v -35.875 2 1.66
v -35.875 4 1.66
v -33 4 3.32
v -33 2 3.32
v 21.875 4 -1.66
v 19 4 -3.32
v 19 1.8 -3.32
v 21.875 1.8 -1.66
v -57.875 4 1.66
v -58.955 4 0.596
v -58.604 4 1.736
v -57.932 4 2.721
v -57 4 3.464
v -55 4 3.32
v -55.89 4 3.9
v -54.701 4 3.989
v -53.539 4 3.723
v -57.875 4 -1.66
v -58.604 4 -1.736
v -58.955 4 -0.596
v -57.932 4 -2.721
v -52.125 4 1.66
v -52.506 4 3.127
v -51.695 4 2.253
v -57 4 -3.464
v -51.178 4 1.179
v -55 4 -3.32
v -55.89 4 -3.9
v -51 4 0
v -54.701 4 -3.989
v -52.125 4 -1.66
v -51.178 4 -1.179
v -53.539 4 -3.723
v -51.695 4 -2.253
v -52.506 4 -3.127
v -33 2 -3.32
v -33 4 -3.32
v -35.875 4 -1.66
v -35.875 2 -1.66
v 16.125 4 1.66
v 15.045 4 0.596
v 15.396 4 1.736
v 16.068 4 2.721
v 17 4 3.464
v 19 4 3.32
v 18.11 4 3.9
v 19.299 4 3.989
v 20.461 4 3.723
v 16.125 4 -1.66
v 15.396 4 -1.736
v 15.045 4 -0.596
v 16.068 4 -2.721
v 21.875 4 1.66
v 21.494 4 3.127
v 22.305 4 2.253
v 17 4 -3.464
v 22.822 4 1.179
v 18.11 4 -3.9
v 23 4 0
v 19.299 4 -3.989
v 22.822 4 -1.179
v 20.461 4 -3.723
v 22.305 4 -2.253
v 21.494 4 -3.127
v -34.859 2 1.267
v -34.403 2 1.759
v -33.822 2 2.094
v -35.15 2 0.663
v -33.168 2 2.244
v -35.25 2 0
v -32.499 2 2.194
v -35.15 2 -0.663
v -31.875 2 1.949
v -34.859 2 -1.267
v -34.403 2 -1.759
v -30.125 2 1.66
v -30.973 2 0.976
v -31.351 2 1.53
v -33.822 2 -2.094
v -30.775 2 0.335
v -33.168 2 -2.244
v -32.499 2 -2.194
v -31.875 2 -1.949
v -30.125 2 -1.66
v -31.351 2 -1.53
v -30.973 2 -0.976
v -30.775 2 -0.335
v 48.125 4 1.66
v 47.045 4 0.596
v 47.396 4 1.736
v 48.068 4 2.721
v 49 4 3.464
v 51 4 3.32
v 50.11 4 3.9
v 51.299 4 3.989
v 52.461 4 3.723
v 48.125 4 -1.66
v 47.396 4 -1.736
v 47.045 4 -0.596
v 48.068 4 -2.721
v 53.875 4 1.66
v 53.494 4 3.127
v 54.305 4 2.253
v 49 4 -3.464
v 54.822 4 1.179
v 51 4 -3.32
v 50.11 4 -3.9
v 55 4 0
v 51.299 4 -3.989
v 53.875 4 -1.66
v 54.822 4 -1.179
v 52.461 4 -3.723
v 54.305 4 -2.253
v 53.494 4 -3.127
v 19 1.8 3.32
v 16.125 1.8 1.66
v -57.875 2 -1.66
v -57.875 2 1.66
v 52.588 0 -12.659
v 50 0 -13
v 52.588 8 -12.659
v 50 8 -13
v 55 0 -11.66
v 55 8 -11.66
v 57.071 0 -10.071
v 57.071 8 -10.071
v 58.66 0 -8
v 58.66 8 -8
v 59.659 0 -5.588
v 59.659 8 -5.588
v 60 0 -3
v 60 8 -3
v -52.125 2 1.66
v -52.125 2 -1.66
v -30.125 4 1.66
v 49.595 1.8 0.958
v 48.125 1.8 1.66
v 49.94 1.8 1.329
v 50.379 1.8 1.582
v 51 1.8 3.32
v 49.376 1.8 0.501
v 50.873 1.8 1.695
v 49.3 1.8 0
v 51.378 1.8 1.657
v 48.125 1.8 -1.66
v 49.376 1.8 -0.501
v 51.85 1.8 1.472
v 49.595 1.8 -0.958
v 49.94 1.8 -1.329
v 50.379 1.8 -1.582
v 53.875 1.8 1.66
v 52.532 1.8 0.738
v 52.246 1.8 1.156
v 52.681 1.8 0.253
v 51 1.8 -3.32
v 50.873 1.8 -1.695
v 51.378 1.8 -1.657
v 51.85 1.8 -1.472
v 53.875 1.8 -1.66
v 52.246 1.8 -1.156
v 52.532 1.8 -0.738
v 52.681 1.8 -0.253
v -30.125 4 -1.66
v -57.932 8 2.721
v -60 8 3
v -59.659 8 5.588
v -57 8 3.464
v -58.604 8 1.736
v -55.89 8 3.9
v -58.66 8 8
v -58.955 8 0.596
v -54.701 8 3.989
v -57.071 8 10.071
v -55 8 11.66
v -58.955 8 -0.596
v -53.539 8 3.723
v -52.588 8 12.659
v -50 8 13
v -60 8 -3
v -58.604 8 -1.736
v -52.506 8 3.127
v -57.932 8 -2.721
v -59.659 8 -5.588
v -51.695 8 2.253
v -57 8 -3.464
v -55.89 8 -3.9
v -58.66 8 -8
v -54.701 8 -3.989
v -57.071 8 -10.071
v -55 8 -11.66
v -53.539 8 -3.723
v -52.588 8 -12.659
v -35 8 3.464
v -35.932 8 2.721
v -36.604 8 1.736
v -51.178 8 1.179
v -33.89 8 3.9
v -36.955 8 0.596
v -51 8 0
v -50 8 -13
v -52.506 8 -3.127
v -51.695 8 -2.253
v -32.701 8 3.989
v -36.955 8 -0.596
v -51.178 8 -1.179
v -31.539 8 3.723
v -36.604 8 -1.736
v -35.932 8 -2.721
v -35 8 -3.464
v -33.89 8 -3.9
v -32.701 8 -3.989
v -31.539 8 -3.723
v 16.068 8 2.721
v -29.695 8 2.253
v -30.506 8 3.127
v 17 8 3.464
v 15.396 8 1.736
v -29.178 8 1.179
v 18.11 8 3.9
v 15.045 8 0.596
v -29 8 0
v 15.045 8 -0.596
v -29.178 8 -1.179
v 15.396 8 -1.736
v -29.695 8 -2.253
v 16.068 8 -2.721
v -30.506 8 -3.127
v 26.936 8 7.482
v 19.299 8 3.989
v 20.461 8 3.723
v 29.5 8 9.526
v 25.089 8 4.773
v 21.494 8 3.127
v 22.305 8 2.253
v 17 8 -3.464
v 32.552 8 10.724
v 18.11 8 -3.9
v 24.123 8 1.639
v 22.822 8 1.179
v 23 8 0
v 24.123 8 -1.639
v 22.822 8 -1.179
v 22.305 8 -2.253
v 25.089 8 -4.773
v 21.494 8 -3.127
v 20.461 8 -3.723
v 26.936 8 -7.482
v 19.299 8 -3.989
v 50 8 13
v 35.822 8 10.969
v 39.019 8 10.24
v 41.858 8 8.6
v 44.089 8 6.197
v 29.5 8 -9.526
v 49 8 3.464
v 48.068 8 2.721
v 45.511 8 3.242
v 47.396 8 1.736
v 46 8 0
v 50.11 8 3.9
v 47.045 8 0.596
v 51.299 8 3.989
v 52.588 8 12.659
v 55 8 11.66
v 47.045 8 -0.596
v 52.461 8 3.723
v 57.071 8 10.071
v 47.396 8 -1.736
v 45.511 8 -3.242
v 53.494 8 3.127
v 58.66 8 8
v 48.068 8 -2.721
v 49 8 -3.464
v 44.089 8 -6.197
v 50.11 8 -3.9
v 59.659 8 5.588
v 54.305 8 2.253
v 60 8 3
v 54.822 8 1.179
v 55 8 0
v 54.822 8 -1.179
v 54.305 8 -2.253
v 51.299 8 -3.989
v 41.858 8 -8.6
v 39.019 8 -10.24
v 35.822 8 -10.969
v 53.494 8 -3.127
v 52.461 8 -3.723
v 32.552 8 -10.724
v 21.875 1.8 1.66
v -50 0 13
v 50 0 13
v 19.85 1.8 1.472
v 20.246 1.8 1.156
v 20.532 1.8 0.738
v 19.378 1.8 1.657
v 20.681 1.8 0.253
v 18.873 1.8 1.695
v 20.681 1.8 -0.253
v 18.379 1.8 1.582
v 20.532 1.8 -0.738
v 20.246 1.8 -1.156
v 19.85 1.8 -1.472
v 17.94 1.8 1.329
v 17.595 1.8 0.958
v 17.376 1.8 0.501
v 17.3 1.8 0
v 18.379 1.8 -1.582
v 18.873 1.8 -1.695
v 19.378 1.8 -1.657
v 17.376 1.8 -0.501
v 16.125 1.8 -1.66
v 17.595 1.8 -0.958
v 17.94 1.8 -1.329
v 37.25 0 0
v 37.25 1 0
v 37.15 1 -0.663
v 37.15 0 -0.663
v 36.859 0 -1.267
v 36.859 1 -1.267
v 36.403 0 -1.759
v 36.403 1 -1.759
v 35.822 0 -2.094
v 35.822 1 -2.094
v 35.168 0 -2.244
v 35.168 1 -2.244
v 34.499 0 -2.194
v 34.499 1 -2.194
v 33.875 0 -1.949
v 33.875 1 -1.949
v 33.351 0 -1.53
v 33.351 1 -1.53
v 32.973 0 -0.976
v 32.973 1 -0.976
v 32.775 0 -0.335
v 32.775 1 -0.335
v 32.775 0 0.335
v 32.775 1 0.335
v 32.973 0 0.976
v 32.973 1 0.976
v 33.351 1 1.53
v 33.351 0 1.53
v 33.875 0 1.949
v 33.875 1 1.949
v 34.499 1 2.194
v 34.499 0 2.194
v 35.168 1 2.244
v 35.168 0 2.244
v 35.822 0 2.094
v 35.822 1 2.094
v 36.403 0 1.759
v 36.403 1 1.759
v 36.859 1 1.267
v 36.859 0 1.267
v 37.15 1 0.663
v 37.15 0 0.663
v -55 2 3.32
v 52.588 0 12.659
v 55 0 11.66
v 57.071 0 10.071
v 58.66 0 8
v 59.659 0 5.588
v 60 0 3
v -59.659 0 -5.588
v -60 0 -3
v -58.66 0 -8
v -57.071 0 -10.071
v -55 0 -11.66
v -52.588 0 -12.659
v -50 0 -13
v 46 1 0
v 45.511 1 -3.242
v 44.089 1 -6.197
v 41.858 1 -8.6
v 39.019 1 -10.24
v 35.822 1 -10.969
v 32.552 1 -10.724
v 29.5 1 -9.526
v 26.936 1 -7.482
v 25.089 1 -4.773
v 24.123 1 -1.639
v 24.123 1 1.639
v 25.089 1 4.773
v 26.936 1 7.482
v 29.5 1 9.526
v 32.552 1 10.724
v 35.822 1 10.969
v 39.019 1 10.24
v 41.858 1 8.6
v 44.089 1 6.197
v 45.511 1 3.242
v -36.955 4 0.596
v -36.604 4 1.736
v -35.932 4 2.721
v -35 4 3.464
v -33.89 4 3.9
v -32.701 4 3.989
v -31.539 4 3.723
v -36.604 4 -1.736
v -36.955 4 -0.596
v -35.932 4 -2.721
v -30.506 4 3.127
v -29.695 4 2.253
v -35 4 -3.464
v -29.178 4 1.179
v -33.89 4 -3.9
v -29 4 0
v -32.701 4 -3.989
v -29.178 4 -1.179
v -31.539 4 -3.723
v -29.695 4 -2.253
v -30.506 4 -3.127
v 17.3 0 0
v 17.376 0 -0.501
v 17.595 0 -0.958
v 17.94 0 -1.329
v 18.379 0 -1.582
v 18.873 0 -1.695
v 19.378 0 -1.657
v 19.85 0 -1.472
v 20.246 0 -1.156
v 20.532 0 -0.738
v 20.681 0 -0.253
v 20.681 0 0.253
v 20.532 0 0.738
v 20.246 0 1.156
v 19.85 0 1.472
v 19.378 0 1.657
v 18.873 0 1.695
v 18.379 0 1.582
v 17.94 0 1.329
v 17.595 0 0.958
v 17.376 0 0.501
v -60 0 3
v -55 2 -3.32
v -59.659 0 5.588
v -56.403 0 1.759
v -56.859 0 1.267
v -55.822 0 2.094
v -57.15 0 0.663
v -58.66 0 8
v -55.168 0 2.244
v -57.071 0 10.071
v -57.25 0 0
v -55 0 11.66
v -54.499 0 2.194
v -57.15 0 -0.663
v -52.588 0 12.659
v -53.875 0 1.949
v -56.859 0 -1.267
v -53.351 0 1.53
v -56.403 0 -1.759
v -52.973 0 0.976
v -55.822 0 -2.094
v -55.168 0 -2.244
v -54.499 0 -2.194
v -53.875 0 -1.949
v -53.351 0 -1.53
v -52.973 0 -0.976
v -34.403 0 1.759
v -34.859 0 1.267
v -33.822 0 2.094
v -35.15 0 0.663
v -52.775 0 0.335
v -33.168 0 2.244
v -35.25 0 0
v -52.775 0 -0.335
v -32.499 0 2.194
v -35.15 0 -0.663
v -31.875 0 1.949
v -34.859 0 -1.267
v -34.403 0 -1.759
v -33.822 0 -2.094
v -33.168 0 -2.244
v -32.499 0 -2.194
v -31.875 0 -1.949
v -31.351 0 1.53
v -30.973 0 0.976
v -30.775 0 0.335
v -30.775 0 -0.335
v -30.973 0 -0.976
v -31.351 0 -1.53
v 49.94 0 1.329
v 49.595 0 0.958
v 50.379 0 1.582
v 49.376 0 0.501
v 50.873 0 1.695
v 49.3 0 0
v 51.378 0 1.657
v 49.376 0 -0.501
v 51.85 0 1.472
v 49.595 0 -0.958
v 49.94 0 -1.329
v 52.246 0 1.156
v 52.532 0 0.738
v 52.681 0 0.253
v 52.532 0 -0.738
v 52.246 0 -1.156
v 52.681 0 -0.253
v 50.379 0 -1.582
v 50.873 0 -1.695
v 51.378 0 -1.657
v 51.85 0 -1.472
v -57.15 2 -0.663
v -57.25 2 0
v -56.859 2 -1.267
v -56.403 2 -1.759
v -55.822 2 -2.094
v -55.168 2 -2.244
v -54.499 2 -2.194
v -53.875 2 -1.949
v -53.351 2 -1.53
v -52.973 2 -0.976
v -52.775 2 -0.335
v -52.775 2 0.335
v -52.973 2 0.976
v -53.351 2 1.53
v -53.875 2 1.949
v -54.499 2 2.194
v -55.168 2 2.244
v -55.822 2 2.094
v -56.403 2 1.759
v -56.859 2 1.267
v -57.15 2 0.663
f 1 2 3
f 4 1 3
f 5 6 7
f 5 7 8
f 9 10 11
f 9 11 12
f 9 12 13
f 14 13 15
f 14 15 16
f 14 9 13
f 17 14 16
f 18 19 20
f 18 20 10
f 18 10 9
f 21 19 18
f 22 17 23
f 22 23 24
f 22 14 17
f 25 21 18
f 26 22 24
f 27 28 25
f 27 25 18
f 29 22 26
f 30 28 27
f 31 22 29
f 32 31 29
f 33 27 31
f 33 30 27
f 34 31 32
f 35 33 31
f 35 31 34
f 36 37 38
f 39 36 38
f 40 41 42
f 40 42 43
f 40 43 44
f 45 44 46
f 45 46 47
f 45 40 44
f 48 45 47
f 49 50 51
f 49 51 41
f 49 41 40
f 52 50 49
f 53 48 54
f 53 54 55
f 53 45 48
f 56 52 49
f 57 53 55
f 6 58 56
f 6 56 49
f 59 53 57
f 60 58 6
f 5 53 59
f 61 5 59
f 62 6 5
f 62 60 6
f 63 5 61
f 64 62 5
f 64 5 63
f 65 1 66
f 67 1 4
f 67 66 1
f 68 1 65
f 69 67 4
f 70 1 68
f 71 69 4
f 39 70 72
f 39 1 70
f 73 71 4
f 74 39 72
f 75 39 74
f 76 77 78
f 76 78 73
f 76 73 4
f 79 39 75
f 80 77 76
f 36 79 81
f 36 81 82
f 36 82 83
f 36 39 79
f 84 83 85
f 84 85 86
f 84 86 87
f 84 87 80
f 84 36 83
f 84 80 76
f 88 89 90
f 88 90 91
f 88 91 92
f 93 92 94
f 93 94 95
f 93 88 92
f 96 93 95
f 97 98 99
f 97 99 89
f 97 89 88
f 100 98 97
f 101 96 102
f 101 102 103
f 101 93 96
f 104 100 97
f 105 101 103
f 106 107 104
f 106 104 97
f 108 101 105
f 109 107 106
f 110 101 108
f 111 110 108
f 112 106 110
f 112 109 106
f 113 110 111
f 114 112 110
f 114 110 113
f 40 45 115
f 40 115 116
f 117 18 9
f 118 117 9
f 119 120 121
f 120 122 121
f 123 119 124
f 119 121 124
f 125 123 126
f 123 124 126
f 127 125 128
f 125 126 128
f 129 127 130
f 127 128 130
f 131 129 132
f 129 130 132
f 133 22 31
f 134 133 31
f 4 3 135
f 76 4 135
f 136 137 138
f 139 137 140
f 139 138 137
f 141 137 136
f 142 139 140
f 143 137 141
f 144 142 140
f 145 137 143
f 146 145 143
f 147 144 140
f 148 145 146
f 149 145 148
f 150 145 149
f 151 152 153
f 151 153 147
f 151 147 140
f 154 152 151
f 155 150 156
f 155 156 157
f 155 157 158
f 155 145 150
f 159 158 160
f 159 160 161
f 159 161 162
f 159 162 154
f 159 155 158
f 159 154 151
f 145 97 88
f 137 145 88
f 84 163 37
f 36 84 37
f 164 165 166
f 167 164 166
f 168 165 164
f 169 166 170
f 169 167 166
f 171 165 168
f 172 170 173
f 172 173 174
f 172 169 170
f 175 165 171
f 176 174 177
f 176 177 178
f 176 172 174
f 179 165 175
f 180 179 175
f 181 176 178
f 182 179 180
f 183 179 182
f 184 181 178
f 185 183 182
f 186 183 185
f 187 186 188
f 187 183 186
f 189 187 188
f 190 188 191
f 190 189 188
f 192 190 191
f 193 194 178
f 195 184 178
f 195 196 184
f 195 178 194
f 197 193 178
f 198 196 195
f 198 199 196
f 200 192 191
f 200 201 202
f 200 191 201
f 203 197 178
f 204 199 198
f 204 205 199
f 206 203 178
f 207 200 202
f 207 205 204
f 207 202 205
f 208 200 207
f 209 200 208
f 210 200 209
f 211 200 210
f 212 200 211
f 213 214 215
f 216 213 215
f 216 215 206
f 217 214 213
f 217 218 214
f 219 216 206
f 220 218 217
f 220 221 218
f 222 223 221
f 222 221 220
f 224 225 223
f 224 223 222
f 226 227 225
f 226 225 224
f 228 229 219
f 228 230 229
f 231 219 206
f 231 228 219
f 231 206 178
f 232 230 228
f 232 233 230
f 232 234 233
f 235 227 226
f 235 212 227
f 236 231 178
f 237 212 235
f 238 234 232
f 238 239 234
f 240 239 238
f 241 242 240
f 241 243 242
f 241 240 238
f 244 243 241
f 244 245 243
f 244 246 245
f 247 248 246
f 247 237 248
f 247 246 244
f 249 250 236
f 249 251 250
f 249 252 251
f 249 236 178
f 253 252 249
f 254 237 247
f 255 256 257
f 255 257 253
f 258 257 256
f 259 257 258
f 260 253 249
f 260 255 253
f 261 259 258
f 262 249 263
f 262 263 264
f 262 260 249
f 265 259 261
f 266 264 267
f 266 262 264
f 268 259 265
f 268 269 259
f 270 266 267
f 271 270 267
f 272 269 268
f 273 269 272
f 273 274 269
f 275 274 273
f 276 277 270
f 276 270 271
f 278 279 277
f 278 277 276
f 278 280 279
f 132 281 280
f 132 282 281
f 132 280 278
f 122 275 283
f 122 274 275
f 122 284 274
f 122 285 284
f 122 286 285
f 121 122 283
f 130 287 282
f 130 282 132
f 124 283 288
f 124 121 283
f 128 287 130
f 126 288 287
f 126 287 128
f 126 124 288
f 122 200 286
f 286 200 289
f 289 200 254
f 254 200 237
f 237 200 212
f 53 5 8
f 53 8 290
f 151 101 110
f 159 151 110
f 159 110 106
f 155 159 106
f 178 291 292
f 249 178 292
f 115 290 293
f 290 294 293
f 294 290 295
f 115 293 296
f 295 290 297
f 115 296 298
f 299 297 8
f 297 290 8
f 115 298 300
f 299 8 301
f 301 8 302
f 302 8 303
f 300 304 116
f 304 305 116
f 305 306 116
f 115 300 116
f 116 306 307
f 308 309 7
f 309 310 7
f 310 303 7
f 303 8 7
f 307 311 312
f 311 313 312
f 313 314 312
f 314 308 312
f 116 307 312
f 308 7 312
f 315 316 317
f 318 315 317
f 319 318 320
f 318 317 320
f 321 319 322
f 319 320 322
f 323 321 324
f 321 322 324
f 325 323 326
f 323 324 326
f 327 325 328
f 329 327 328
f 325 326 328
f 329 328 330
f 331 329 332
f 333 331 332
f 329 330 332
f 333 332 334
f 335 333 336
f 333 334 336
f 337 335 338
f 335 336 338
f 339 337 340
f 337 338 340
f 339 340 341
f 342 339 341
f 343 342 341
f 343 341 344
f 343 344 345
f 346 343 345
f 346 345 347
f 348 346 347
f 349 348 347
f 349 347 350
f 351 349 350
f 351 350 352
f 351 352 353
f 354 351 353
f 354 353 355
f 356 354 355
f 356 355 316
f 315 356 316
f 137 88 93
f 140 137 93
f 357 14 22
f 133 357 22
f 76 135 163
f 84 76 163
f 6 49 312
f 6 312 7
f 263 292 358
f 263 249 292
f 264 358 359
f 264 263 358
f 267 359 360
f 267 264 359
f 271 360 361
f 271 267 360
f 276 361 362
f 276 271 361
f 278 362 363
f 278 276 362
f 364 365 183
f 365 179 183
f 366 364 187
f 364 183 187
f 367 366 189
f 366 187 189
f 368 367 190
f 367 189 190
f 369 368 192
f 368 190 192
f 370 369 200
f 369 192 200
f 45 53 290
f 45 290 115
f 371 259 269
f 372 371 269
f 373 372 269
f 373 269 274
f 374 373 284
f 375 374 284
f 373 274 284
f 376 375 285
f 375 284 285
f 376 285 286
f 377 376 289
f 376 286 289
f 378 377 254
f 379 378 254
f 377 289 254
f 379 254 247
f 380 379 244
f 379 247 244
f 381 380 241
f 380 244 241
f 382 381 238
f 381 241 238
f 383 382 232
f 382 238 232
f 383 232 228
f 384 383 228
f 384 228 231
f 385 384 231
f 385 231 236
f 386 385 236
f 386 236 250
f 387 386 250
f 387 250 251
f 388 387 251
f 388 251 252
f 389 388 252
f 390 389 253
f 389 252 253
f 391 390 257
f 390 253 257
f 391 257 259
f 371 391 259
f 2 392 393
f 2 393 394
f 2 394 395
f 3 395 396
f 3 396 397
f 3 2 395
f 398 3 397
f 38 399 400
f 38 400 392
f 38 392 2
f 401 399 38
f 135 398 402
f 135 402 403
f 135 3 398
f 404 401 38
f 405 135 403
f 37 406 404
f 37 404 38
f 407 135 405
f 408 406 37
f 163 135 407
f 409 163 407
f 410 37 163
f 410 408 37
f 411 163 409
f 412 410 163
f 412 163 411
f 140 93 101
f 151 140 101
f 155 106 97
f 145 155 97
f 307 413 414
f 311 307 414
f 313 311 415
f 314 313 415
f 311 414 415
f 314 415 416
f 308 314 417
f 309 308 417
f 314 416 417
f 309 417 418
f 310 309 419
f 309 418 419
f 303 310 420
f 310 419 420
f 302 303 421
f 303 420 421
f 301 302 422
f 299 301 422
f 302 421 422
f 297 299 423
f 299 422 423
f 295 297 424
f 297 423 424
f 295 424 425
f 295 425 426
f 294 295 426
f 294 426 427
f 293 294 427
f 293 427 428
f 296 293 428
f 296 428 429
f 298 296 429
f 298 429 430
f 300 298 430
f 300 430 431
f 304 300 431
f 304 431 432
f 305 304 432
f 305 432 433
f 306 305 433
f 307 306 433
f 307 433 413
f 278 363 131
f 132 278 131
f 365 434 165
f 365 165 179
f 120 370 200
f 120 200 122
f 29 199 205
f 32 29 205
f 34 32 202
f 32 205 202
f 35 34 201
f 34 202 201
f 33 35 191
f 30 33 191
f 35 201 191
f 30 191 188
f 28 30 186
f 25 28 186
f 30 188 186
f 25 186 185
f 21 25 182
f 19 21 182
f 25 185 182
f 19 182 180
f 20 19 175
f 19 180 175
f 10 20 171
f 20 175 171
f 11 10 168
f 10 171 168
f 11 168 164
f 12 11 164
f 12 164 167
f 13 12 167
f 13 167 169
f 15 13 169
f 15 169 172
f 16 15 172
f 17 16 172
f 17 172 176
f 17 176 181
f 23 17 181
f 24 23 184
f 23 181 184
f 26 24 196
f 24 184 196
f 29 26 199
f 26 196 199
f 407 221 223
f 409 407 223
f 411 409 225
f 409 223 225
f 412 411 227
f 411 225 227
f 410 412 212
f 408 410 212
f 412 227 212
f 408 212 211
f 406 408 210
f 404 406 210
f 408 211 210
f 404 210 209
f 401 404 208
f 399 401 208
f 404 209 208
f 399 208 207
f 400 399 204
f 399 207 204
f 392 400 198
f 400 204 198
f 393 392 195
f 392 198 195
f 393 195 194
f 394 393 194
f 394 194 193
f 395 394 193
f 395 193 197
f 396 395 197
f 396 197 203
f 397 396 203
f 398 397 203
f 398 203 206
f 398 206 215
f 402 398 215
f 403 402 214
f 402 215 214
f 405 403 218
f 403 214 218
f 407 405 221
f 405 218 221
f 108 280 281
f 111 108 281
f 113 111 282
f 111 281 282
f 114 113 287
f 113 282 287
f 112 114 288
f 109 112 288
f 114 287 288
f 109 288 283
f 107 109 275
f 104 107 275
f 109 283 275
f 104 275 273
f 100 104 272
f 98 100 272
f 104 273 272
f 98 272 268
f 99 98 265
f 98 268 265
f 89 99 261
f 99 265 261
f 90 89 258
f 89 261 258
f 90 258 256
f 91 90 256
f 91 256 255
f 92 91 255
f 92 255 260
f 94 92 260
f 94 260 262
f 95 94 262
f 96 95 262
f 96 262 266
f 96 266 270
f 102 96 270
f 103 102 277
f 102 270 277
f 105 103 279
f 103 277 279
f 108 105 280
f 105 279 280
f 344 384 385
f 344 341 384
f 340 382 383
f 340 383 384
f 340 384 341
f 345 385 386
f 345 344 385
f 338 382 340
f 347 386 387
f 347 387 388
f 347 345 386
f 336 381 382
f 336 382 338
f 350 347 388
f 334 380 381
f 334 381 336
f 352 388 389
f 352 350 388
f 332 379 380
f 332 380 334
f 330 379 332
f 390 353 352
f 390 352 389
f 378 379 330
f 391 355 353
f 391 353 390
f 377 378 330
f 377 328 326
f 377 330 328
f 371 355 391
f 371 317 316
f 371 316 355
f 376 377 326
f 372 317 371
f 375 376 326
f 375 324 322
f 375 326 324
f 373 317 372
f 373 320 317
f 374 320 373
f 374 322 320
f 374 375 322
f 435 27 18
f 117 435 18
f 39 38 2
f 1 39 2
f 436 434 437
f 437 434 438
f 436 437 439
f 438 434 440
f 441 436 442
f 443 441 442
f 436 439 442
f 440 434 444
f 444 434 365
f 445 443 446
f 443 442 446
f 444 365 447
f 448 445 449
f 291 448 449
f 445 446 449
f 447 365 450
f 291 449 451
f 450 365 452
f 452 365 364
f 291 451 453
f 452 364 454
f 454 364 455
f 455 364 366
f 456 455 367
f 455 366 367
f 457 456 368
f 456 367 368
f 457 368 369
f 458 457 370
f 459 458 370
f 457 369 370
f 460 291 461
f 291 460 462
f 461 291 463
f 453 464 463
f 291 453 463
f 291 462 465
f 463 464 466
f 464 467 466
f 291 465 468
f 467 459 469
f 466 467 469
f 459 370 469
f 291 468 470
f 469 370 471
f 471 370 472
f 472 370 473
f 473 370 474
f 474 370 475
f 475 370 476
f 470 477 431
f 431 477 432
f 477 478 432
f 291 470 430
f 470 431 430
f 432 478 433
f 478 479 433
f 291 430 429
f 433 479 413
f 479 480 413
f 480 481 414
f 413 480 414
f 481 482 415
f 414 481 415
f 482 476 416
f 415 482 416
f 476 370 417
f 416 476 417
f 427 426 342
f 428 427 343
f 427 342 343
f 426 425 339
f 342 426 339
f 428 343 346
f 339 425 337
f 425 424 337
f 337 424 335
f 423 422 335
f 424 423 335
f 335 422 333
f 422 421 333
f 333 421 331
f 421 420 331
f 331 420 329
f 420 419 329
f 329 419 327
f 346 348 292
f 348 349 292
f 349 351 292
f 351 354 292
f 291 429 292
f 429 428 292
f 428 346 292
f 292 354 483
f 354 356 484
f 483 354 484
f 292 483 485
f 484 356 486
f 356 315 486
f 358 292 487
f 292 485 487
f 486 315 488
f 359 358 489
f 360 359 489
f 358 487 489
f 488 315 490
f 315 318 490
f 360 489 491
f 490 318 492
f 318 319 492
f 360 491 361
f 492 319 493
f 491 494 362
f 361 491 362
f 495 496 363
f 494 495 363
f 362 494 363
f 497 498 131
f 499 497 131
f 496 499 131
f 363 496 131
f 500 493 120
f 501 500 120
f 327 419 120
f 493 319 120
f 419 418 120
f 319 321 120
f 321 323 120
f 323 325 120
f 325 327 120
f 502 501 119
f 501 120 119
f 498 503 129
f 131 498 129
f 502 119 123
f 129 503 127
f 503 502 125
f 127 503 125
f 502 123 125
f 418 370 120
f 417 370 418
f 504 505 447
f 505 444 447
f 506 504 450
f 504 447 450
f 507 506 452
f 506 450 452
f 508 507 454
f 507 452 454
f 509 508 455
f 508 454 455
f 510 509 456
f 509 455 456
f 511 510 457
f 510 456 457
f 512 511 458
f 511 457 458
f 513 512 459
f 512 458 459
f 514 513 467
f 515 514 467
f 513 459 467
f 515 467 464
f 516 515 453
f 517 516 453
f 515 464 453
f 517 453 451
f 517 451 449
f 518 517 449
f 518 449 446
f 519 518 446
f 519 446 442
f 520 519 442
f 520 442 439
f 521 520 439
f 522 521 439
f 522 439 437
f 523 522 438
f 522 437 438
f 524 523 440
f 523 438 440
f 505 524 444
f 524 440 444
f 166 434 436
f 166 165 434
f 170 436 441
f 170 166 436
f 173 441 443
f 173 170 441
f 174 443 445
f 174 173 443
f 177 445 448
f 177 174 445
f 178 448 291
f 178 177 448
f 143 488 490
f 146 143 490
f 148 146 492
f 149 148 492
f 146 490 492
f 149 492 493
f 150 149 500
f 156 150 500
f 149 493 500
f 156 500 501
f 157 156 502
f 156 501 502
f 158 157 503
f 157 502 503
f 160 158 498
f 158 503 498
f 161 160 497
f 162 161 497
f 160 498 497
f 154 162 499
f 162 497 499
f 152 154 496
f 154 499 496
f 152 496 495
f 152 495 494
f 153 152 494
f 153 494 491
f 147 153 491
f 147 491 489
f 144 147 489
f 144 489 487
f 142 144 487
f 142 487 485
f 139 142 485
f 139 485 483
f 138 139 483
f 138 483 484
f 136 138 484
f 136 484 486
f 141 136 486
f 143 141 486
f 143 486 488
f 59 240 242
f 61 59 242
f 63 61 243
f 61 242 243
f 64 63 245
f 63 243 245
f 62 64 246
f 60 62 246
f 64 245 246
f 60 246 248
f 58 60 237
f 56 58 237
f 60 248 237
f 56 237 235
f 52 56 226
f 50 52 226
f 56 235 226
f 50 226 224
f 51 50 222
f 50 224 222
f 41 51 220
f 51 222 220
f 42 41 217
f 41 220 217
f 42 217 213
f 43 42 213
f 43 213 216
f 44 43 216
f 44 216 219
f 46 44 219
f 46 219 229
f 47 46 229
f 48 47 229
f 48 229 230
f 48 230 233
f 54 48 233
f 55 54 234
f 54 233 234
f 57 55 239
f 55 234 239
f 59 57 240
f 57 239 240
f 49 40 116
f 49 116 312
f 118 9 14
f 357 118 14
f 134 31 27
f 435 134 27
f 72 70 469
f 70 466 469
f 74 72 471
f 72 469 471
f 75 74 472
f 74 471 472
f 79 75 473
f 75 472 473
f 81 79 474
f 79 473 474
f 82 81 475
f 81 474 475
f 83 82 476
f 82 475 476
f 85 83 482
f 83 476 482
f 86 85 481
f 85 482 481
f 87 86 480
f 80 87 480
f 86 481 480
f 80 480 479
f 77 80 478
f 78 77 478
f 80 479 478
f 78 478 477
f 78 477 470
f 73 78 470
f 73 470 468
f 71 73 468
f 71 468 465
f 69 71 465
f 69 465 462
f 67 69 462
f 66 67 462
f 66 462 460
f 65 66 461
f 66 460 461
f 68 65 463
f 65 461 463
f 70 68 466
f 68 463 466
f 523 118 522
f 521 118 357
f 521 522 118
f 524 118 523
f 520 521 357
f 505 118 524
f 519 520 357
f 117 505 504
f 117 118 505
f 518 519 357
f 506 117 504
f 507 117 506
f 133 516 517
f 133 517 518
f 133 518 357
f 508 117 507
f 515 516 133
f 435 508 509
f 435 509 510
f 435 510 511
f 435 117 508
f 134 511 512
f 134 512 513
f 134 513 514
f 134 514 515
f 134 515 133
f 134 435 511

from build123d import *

# Parameters (mm, degrees)
SKETCH1_W                = 120
SKETCH1_H                = 26
BOSS_EXTRUDE1_DEPTH      = 8
SKETCH2_R                = 11
CUT_EXTRUDE1_DEPTH       = 7
SKETCH5_R                = 2.25
CUT_EXTRUDE2_DEPTH       = 2
SKETCH6_R                = 4
CUT_EXTRUDE3_DEPTH       = 4
CUT_EXTRUDE4_DEPTH       = 2.2
M3_CLEARANCE_HOLE1_D     = 3.4
M3_CLEARANCE_HOLE1_DEPTH = 1.8
M4_CLEARANCE_HOLE1_D     = 4.5
SKETCH10_R               = 4
CUT_EXTRUDE5_DEPTH       = 4
CUT_EXTRUDE6_DEPTH       = 2
FILLET1_R                = 10


with BuildPart() as part:
    # Sketch1 → Boss-Extrude1 (new body)
    with BuildSketch(Plane(origin=(0, 0, 0), x_dir=(1, 0, 0), z_dir=(0, 1, 0))):
        Rectangle(SKETCH1_W, SKETCH1_H)
    extrude(amount=BOSS_EXTRUDE1_DEPTH)

    # Sketch2 → Cut-Extrude1 (cut)
    with BuildSketch(Plane(origin=(0, 8, 0), x_dir=(1, 0, 0), z_dir=(0, 1, 0))):
        with Locations((35, 0)):
            Circle(SKETCH2_R)
    extrude(amount=-CUT_EXTRUDE1_DEPTH, mode=Mode.SUBTRACT)

    # Sketch5 → Cut-Extrude2 (cut, through all)
    with BuildSketch(Plane(origin=(0, 1, 0), x_dir=(1, 0, 0), z_dir=(0, 1, 0))):
        with Locations((35, 0)):
            Circle(SKETCH5_R)
    extrude(amount=-CUT_EXTRUDE2_DEPTH, mode=Mode.SUBTRACT)

    # Sketch6 → Cut-Extrude3 (cut)
    with BuildSketch(Plane(origin=(0, 8, 0), x_dir=(1, 0, 0), z_dir=(0, 1, 0))):
        with Locations((51, 0)):
            Circle(SKETCH6_R)
        with Locations((19, 0)):
            Circle(SKETCH6_R)
    extrude(amount=-CUT_EXTRUDE3_DEPTH, mode=Mode.SUBTRACT)

    # Sketch7 → Cut-Extrude4 (cut)
    with BuildSketch(Plane(origin=(0, 4, 0), x_dir=(1, 0, 0), z_dir=(0, 1, 0))):
        Polygon((53.875, -1.659882024), (53.875, 1.659882024), (51, 3.319764048), (48.125, 1.659882024), (48.125, -1.659882024), (51, -3.319764048), align=None)
        Polygon((19, -3.319764048), (16.125, -1.659882024), (16.125, 1.659882024), (19, 3.319764048), (21.875, 1.659882024), (21.875, -1.659882024), align=None)
    extrude(amount=-CUT_EXTRUDE4_DEPTH, mode=Mode.SUBTRACT)

    # M3 Clearance Hole1
    with Locations(Plane(origin=(0, 1.8, 0), x_dir=(1, 0, 0), z_dir=(0, 1, 0))):
        with Locations((51, 0), (19, 0)):
            Hole(M3_CLEARANCE_HOLE1_D / 2, depth=M3_CLEARANCE_HOLE1_DEPTH)

    # M4 Clearance Hole1 (through all)
    with Locations(Plane(origin=(0, 8, 0), x_dir=(1, 0, 0), z_dir=(0, 1, 0))):
        with Locations((-33, 0), (-55, 0)):
            Hole(M4_CLEARANCE_HOLE1_D / 2)

    # Sketch10 → Cut-Extrude5 (cut)
    with BuildSketch(Plane(origin=(0, 8, 0), x_dir=(1, 0, 0), z_dir=(0, 1, 0))):
        with Locations((-55, 0)):
            Circle(SKETCH10_R)
        with Locations((-33, 0)):
            Circle(SKETCH10_R)
    extrude(amount=-CUT_EXTRUDE5_DEPTH, mode=Mode.SUBTRACT)

    # Sketch11 → Cut-Extrude6 (cut)
    with BuildSketch(Plane(origin=(0, 4, 0), x_dir=(1, 0, 0), z_dir=(0, 1, 0))):
        Polygon((-55, -3.319764048), (-52.125, -1.659882024), (-52.125, 1.659882024), (-55, 3.319764048), (-57.875, 1.659882024), (-57.875, -1.659882024), align=None)
        Polygon((-35.875, -1.659882024), (-33, -3.319764048), (-30.125, -1.659882024), (-30.125, 1.659882024), (-33, 3.319764048), (-35.875, 1.659882024), align=None)
    extrude(amount=-CUT_EXTRUDE6_DEPTH, mode=Mode.SUBTRACT)

    # Fillet1
    fillet1_edges = [part.edges().sort_by_distance(p)[0] for p in [
        (-60, 4, -13),
        (60, 4, -13),
        (60, 4, 13),
        (-60, 4, 13),
    ]]
    fillet(fillet1_edges, radius=FILLET1_R)


solid = part.part
